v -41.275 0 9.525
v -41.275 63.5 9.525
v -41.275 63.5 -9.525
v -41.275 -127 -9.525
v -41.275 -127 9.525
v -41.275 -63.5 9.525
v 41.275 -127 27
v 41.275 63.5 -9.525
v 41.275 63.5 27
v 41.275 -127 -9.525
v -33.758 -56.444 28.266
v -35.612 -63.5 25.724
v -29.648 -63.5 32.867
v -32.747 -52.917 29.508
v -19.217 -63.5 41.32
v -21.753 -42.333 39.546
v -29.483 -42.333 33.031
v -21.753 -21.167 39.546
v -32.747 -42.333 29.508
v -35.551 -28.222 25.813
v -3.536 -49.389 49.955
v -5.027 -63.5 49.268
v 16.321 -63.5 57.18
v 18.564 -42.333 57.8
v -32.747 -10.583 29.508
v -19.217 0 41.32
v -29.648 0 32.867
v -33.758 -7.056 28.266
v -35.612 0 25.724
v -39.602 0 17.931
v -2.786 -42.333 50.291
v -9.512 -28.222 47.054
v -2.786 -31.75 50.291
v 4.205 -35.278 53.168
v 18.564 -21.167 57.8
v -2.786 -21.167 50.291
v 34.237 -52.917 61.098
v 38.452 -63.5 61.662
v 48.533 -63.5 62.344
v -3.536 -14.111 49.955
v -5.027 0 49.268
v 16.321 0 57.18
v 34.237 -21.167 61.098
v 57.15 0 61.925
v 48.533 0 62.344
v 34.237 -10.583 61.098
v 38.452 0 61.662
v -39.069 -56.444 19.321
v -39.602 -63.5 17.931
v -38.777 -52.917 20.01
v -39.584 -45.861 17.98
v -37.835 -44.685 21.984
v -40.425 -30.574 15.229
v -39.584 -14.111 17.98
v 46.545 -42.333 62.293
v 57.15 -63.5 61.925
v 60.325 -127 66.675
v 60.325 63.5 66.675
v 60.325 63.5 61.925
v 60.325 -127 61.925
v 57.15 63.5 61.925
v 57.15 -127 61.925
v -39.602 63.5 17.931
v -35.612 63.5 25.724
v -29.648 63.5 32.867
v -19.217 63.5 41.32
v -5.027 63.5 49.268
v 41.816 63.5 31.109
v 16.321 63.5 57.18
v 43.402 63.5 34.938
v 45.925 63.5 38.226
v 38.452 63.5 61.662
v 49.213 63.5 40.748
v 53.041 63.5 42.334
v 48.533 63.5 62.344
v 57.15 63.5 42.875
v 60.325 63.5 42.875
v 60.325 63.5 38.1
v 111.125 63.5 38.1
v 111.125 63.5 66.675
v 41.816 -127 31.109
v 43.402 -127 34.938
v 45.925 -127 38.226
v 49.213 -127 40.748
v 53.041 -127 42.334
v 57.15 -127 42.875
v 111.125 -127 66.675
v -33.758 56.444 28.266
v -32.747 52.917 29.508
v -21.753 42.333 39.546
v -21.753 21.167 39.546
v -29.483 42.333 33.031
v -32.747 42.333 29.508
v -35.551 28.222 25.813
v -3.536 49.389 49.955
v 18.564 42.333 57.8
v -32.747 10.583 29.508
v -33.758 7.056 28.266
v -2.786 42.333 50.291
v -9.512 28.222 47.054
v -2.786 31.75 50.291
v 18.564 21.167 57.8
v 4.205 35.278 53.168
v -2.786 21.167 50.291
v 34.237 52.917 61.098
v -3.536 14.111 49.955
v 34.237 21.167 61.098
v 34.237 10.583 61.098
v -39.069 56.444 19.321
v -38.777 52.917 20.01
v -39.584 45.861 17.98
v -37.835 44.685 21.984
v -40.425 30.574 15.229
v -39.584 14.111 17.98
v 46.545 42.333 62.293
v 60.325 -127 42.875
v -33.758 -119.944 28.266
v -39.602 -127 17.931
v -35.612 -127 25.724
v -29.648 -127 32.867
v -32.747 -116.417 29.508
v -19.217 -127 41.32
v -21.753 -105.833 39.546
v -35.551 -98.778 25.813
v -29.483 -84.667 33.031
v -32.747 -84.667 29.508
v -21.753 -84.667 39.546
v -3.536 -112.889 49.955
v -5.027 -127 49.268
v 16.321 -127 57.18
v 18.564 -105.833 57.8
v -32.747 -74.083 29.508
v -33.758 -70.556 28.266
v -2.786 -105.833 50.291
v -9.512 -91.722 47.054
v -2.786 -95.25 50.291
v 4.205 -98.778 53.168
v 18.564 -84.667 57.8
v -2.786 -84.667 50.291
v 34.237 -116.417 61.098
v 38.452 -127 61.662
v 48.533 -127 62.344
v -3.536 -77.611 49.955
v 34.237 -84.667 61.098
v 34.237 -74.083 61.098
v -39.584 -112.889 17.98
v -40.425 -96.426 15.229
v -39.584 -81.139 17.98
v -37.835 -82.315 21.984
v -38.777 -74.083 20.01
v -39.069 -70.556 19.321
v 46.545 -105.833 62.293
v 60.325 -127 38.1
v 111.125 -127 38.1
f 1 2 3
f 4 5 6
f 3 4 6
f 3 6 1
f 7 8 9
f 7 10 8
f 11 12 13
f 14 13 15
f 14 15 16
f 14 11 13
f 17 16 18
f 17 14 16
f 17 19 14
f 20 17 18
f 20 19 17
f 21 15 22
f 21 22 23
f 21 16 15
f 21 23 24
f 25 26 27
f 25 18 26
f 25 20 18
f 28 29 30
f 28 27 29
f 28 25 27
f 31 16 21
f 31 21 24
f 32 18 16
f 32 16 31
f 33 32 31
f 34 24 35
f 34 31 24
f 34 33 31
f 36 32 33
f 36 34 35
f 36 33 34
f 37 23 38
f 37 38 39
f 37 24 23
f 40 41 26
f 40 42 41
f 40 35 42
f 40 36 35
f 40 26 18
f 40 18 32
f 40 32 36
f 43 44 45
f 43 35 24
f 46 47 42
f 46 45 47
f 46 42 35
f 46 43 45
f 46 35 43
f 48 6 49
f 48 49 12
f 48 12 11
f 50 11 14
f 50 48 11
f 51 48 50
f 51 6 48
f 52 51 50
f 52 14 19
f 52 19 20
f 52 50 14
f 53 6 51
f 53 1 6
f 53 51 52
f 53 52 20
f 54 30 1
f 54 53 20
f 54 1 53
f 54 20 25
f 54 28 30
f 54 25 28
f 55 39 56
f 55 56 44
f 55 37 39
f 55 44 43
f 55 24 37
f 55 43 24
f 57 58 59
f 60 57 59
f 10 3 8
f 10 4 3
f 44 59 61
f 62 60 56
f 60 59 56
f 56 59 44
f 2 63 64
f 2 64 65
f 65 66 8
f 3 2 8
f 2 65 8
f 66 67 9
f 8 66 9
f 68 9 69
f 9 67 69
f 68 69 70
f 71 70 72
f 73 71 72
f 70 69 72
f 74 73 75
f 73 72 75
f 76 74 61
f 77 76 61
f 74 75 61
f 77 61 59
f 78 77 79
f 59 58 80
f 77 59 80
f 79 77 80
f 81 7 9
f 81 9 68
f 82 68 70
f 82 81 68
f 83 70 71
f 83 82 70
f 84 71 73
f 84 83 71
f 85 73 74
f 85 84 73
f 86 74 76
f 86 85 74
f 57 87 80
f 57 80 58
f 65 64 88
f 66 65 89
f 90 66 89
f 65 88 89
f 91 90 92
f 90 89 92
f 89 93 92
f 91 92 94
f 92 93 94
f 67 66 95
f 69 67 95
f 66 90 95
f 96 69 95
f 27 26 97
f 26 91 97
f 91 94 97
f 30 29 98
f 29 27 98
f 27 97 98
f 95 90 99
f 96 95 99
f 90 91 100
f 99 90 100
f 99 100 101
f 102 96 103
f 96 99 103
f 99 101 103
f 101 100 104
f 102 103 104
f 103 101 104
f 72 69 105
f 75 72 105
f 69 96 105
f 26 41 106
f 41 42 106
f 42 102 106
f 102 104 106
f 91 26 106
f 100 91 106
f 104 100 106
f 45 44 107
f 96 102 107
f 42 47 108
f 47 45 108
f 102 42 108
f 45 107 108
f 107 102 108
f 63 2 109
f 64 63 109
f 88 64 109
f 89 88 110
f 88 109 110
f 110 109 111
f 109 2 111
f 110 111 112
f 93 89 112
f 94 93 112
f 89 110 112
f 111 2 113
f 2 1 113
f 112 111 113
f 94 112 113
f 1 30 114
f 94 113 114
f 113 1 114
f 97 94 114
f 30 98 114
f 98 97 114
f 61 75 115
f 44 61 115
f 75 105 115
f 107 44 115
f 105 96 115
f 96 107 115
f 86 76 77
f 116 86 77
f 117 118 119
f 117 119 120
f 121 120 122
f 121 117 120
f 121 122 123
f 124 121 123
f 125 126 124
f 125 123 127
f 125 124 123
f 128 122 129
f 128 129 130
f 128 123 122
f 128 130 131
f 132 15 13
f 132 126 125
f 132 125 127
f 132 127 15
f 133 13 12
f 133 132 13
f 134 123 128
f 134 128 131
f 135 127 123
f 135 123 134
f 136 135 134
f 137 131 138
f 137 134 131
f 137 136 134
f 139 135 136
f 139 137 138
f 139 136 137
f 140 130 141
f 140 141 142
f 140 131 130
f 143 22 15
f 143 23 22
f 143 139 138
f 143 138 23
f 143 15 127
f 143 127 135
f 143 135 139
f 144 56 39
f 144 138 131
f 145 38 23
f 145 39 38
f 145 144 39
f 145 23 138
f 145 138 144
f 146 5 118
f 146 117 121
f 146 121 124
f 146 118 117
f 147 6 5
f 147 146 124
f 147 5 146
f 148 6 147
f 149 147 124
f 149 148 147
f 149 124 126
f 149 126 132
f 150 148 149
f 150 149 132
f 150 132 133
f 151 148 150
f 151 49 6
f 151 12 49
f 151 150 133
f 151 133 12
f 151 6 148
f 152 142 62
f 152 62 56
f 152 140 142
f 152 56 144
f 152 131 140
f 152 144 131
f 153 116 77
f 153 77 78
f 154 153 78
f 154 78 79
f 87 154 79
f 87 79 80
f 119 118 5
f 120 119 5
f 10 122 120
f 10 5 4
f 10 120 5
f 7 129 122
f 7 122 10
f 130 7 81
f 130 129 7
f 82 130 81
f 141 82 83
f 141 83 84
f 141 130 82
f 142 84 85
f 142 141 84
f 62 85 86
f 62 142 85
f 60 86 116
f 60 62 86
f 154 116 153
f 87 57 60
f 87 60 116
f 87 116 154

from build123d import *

# Parameters (mm, degrees)
F0_W     = 25.4
F0_H     = 4.7498
F1_DEPTH = 63.5
F2_DEPTH = 63.5


with BuildPart() as f1:
    # F0 (on Front) → F1 (new body, symmetric)
    with BuildSketch(Plane.XZ):
        Polygon((41.275, -9.525), (41.275, 9.525), (22.225, 9.525), (-41.275, 9.525), (-41.275, -9.525), align=None)
        with BuildLine():
            Line((22.225, 9.525), (41.275, 9.525))
            Line((41.275, 9.525), (41.275, 27.0002))
            ThreePointArc((41.275, 27.0002), (45.92468, 38.22552), (57.15, 42.8752))
            Line((57.15, 42.8752), (60.325, 42.8752))
            Line((60.325, 42.8752), (60.325, 61.9252))
            Line((60.325, 61.9252), (57.15, 61.9252))
            ThreePointArc((57.15, 61.9252), (32.454296, 51.695904), (22.225, 27.0002))
            Line((22.225, 27.0002), (22.225, 9.525))
        make_face()
        with BuildLine():
            Line((-41.275, 9.525), (22.225, 9.525))
            Line((22.225, 9.525), (22.225, 27.0002))
            ThreePointArc((22.225, 27.0002), (32.454296, 51.695904), (57.15, 61.9252))
            add(Edge.make_bspline(
                [(-41.275, 9.525), (-39.657938, 44.64065), (26.937186, 65.652682), (57.15, 61.9252)],
                knots=[0, 0, 0, 0, 111.504536, 111.504536, 111.504536, 111.504536], degree=3))
        make_face()
        Polygon((60.325, 61.9252), (60.325, 42.8752), (60.325, 38.1), (111.125, 38.1), (111.125, 66.675), (85.725, 66.675), (85.725, 61.9252), align=None)
        with Locations((73.025, 64.3001)):
            Rectangle(F0_W, F0_H)
    extrude(amount=F1_DEPTH, both=True)

    # F1_face (on face) → F2 (join, symmetric)
    with BuildSketch(Plane(origin=(25.424226, -63.5, 29.456982), x_dir=(1, 0, 0), z_dir=(0, -1, 0))):
        with BuildLine():
            Line((15.850774, -38.981982), (15.850774, -2.456782))
            ThreePointArc((15.850774, -2.456782), (20.500454, 8.768538), (31.725774, 13.418218))
            Line((31.725774, 13.418218), (34.900774, 13.418218))
            Line((34.900774, 13.418218), (34.900774, 8.643018))
            Line((34.900774, 8.643018), (85.700774, 8.643018))
            Line((85.700774, 8.643018), (85.700774, 37.218018))
            Line((85.700774, 37.218018), (34.900774, 37.218018))
            Line((34.900774, 37.218018), (34.900774, 32.468218))
            Line((34.900774, 32.468218), (31.725774, 32.468218))
            add(Edge.make_bspline(
                [(-66.699226, -19.931982), (-65.082164, 15.183668), (1.51296, 36.1957), (31.725774, 32.468218)],
                knots=[0, 0, 0, 0, 111.504536, 111.504536, 111.504536, 111.504536], degree=3))
            Line((-66.699226, -19.931982), (-66.699226, -38.981982))
            Line((-66.699226, -38.981982), (15.850774, -38.981982))
        make_face()
    extrude(amount=F2_DEPTH, both=True)


solid = f1.part
